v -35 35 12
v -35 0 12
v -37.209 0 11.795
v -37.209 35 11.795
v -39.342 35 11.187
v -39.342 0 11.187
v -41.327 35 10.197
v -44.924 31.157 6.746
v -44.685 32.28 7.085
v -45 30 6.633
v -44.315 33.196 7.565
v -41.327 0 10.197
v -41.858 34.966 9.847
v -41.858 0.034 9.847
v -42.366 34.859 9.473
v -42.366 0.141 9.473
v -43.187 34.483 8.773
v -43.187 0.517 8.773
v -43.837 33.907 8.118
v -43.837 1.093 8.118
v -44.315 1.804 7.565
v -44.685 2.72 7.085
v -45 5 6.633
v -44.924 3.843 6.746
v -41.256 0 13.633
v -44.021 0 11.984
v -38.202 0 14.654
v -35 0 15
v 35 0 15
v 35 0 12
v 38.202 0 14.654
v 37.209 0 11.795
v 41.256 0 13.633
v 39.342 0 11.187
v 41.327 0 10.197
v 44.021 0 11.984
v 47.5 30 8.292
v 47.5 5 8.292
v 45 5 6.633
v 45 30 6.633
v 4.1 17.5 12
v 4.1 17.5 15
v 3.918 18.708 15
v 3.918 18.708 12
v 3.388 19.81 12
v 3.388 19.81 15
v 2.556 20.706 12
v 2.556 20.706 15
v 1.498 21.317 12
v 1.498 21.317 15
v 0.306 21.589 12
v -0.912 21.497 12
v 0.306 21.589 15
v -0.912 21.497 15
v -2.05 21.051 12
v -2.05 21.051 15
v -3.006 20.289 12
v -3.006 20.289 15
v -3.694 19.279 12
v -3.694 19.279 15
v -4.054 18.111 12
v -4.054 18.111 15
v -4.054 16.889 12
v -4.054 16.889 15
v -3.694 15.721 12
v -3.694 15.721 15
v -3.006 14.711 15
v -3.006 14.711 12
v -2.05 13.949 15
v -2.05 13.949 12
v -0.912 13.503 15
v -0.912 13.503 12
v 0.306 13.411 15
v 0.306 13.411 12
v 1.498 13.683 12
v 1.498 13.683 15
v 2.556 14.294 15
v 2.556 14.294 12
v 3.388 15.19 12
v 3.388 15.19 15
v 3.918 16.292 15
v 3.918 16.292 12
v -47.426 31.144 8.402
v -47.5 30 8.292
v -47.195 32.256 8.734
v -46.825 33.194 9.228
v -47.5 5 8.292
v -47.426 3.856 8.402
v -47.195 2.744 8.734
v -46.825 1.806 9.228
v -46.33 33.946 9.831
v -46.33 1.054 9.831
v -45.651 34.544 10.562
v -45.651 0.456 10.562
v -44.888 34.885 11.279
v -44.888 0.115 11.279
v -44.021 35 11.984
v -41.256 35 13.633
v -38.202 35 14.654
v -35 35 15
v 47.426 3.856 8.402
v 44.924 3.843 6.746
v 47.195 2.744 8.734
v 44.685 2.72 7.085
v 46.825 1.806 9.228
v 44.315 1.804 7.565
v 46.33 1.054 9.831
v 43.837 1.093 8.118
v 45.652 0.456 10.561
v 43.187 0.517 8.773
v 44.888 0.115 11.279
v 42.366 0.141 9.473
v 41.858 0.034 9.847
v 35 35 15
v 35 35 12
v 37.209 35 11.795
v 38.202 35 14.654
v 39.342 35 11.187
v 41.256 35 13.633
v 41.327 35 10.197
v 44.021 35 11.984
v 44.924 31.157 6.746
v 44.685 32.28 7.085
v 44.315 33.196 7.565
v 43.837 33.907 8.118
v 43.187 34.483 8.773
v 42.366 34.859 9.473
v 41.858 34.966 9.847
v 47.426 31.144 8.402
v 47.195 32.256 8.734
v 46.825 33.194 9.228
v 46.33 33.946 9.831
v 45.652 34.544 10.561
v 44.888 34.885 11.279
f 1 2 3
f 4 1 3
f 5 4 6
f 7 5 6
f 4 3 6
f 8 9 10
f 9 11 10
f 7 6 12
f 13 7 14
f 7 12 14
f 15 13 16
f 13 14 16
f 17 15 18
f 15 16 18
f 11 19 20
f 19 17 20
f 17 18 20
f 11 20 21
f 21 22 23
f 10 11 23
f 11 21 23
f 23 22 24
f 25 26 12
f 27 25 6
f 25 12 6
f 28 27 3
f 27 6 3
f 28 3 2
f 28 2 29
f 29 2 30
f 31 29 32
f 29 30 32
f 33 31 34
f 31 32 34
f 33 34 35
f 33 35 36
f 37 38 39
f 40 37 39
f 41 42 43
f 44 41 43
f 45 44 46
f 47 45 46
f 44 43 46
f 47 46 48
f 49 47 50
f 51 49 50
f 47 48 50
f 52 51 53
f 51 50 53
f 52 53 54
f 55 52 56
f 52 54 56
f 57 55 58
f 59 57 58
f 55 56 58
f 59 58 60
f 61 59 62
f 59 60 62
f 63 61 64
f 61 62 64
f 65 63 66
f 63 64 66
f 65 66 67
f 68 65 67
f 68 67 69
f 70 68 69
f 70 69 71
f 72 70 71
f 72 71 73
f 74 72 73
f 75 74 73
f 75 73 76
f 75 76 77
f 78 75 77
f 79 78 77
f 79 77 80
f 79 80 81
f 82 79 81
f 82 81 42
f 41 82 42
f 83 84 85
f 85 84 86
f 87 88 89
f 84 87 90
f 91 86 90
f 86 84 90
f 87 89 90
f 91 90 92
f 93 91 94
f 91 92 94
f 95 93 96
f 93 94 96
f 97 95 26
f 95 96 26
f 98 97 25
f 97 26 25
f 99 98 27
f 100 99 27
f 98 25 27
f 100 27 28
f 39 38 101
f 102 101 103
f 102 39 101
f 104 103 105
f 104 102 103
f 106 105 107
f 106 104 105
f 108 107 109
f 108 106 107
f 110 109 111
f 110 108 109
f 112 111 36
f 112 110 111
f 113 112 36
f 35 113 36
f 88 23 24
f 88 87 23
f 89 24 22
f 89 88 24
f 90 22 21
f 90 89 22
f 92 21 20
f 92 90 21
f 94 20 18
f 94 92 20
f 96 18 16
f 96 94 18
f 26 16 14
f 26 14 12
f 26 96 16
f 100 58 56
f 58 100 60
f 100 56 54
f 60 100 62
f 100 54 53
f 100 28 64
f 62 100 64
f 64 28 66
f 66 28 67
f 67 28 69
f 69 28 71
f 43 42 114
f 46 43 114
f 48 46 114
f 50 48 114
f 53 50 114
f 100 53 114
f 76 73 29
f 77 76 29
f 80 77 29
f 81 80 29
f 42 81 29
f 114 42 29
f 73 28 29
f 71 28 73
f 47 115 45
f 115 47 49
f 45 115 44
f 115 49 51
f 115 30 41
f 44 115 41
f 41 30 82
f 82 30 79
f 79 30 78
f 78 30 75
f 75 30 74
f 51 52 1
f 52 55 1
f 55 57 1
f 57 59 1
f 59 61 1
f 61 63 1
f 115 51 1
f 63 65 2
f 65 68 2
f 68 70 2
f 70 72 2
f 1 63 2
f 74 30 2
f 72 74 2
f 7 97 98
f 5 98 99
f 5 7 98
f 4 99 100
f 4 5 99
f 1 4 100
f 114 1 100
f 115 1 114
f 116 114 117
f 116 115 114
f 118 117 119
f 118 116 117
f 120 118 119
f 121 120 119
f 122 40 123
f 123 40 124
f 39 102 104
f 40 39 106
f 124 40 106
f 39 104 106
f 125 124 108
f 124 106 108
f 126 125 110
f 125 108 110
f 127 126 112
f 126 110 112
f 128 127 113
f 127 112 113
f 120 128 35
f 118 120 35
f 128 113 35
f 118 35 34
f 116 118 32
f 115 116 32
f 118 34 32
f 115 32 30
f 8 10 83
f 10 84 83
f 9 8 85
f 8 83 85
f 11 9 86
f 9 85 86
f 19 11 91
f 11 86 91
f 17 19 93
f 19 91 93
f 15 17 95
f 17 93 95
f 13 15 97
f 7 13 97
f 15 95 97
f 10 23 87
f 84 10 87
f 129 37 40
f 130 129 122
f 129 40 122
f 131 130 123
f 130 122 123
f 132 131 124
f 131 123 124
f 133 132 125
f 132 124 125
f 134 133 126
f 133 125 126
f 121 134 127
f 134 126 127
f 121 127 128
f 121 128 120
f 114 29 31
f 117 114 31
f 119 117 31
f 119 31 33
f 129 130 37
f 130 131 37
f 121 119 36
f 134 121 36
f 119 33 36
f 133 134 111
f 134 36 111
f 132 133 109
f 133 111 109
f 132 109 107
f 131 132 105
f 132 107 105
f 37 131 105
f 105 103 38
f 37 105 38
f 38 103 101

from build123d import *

# Parameters (mm, degrees)
BOSS_EXTRUDE1_DEPTH = 35
FILLET1_R           = 5
CUT_EXTRUDE1_REACH  = 61.592
SKETCH2_R           = 4.1


with BuildPart() as part:
    # Sketch1 → Boss-Extrude1 (new body)
    with BuildSketch(Plane(origin=(0, 0, 0), x_dir=(1, 0, 0), z_dir=(0, 1, 0))):
        with BuildLine():
            ThreePointArc((-35, -12), (-40.674548662, -10.573528147), (-45, -6.633249581))
            Line((-45, -6.633249581), (-47.5, -8.291561976))
            ThreePointArc((-47.5, -8.291561976), (-42.093185827, -13.216910184), (-35, -15))
            Line((-35, -15), (35, -15))
            ThreePointArc((35, -15), (42.093185827, -13.216910184), (47.5, -8.291561976))
            Line((47.5, -8.291561976), (45, -6.633249581))
            ThreePointArc((45, -6.633249581), (40.674548662, -10.573528147), (35, -12))
            Line((35, -12), (-35, -12))
        make_face()
    extrude(amount=BOSS_EXTRUDE1_DEPTH)

    # Fillet1
    fillet1_edges = [part.edges().sort_by_distance(p)[0] for p in [
        (46.25, 0, 7.462405778),
        (-46.25, 0, 7.462405778),
        (46.25, 35, 7.462405778),
        (-46.25, 35, 7.462405778),
    ]]
    fillet(fillet1_edges, radius=FILLET1_R)

    # Sketch2 → Cut-Extrude1 (cut, up to next)
    with BuildSketch(Plane.XY.offset(15), mode=Mode.PRIVATE) as cut_extrude1_sk1:
        with Locations((0, 17.5)):
            Circle(SKETCH2_R)
    cut_extrude1_tool1 = extrude(cut_extrude1_sk1.sketch, amount=-CUT_EXTRUDE1_REACH, mode=Mode.PRIVATE) & part.part
    add(cut_extrude1_tool1.solids().sort_by_distance((0, 17.5, 15))[0], mode=Mode.SUBTRACT)


solid = part.part
